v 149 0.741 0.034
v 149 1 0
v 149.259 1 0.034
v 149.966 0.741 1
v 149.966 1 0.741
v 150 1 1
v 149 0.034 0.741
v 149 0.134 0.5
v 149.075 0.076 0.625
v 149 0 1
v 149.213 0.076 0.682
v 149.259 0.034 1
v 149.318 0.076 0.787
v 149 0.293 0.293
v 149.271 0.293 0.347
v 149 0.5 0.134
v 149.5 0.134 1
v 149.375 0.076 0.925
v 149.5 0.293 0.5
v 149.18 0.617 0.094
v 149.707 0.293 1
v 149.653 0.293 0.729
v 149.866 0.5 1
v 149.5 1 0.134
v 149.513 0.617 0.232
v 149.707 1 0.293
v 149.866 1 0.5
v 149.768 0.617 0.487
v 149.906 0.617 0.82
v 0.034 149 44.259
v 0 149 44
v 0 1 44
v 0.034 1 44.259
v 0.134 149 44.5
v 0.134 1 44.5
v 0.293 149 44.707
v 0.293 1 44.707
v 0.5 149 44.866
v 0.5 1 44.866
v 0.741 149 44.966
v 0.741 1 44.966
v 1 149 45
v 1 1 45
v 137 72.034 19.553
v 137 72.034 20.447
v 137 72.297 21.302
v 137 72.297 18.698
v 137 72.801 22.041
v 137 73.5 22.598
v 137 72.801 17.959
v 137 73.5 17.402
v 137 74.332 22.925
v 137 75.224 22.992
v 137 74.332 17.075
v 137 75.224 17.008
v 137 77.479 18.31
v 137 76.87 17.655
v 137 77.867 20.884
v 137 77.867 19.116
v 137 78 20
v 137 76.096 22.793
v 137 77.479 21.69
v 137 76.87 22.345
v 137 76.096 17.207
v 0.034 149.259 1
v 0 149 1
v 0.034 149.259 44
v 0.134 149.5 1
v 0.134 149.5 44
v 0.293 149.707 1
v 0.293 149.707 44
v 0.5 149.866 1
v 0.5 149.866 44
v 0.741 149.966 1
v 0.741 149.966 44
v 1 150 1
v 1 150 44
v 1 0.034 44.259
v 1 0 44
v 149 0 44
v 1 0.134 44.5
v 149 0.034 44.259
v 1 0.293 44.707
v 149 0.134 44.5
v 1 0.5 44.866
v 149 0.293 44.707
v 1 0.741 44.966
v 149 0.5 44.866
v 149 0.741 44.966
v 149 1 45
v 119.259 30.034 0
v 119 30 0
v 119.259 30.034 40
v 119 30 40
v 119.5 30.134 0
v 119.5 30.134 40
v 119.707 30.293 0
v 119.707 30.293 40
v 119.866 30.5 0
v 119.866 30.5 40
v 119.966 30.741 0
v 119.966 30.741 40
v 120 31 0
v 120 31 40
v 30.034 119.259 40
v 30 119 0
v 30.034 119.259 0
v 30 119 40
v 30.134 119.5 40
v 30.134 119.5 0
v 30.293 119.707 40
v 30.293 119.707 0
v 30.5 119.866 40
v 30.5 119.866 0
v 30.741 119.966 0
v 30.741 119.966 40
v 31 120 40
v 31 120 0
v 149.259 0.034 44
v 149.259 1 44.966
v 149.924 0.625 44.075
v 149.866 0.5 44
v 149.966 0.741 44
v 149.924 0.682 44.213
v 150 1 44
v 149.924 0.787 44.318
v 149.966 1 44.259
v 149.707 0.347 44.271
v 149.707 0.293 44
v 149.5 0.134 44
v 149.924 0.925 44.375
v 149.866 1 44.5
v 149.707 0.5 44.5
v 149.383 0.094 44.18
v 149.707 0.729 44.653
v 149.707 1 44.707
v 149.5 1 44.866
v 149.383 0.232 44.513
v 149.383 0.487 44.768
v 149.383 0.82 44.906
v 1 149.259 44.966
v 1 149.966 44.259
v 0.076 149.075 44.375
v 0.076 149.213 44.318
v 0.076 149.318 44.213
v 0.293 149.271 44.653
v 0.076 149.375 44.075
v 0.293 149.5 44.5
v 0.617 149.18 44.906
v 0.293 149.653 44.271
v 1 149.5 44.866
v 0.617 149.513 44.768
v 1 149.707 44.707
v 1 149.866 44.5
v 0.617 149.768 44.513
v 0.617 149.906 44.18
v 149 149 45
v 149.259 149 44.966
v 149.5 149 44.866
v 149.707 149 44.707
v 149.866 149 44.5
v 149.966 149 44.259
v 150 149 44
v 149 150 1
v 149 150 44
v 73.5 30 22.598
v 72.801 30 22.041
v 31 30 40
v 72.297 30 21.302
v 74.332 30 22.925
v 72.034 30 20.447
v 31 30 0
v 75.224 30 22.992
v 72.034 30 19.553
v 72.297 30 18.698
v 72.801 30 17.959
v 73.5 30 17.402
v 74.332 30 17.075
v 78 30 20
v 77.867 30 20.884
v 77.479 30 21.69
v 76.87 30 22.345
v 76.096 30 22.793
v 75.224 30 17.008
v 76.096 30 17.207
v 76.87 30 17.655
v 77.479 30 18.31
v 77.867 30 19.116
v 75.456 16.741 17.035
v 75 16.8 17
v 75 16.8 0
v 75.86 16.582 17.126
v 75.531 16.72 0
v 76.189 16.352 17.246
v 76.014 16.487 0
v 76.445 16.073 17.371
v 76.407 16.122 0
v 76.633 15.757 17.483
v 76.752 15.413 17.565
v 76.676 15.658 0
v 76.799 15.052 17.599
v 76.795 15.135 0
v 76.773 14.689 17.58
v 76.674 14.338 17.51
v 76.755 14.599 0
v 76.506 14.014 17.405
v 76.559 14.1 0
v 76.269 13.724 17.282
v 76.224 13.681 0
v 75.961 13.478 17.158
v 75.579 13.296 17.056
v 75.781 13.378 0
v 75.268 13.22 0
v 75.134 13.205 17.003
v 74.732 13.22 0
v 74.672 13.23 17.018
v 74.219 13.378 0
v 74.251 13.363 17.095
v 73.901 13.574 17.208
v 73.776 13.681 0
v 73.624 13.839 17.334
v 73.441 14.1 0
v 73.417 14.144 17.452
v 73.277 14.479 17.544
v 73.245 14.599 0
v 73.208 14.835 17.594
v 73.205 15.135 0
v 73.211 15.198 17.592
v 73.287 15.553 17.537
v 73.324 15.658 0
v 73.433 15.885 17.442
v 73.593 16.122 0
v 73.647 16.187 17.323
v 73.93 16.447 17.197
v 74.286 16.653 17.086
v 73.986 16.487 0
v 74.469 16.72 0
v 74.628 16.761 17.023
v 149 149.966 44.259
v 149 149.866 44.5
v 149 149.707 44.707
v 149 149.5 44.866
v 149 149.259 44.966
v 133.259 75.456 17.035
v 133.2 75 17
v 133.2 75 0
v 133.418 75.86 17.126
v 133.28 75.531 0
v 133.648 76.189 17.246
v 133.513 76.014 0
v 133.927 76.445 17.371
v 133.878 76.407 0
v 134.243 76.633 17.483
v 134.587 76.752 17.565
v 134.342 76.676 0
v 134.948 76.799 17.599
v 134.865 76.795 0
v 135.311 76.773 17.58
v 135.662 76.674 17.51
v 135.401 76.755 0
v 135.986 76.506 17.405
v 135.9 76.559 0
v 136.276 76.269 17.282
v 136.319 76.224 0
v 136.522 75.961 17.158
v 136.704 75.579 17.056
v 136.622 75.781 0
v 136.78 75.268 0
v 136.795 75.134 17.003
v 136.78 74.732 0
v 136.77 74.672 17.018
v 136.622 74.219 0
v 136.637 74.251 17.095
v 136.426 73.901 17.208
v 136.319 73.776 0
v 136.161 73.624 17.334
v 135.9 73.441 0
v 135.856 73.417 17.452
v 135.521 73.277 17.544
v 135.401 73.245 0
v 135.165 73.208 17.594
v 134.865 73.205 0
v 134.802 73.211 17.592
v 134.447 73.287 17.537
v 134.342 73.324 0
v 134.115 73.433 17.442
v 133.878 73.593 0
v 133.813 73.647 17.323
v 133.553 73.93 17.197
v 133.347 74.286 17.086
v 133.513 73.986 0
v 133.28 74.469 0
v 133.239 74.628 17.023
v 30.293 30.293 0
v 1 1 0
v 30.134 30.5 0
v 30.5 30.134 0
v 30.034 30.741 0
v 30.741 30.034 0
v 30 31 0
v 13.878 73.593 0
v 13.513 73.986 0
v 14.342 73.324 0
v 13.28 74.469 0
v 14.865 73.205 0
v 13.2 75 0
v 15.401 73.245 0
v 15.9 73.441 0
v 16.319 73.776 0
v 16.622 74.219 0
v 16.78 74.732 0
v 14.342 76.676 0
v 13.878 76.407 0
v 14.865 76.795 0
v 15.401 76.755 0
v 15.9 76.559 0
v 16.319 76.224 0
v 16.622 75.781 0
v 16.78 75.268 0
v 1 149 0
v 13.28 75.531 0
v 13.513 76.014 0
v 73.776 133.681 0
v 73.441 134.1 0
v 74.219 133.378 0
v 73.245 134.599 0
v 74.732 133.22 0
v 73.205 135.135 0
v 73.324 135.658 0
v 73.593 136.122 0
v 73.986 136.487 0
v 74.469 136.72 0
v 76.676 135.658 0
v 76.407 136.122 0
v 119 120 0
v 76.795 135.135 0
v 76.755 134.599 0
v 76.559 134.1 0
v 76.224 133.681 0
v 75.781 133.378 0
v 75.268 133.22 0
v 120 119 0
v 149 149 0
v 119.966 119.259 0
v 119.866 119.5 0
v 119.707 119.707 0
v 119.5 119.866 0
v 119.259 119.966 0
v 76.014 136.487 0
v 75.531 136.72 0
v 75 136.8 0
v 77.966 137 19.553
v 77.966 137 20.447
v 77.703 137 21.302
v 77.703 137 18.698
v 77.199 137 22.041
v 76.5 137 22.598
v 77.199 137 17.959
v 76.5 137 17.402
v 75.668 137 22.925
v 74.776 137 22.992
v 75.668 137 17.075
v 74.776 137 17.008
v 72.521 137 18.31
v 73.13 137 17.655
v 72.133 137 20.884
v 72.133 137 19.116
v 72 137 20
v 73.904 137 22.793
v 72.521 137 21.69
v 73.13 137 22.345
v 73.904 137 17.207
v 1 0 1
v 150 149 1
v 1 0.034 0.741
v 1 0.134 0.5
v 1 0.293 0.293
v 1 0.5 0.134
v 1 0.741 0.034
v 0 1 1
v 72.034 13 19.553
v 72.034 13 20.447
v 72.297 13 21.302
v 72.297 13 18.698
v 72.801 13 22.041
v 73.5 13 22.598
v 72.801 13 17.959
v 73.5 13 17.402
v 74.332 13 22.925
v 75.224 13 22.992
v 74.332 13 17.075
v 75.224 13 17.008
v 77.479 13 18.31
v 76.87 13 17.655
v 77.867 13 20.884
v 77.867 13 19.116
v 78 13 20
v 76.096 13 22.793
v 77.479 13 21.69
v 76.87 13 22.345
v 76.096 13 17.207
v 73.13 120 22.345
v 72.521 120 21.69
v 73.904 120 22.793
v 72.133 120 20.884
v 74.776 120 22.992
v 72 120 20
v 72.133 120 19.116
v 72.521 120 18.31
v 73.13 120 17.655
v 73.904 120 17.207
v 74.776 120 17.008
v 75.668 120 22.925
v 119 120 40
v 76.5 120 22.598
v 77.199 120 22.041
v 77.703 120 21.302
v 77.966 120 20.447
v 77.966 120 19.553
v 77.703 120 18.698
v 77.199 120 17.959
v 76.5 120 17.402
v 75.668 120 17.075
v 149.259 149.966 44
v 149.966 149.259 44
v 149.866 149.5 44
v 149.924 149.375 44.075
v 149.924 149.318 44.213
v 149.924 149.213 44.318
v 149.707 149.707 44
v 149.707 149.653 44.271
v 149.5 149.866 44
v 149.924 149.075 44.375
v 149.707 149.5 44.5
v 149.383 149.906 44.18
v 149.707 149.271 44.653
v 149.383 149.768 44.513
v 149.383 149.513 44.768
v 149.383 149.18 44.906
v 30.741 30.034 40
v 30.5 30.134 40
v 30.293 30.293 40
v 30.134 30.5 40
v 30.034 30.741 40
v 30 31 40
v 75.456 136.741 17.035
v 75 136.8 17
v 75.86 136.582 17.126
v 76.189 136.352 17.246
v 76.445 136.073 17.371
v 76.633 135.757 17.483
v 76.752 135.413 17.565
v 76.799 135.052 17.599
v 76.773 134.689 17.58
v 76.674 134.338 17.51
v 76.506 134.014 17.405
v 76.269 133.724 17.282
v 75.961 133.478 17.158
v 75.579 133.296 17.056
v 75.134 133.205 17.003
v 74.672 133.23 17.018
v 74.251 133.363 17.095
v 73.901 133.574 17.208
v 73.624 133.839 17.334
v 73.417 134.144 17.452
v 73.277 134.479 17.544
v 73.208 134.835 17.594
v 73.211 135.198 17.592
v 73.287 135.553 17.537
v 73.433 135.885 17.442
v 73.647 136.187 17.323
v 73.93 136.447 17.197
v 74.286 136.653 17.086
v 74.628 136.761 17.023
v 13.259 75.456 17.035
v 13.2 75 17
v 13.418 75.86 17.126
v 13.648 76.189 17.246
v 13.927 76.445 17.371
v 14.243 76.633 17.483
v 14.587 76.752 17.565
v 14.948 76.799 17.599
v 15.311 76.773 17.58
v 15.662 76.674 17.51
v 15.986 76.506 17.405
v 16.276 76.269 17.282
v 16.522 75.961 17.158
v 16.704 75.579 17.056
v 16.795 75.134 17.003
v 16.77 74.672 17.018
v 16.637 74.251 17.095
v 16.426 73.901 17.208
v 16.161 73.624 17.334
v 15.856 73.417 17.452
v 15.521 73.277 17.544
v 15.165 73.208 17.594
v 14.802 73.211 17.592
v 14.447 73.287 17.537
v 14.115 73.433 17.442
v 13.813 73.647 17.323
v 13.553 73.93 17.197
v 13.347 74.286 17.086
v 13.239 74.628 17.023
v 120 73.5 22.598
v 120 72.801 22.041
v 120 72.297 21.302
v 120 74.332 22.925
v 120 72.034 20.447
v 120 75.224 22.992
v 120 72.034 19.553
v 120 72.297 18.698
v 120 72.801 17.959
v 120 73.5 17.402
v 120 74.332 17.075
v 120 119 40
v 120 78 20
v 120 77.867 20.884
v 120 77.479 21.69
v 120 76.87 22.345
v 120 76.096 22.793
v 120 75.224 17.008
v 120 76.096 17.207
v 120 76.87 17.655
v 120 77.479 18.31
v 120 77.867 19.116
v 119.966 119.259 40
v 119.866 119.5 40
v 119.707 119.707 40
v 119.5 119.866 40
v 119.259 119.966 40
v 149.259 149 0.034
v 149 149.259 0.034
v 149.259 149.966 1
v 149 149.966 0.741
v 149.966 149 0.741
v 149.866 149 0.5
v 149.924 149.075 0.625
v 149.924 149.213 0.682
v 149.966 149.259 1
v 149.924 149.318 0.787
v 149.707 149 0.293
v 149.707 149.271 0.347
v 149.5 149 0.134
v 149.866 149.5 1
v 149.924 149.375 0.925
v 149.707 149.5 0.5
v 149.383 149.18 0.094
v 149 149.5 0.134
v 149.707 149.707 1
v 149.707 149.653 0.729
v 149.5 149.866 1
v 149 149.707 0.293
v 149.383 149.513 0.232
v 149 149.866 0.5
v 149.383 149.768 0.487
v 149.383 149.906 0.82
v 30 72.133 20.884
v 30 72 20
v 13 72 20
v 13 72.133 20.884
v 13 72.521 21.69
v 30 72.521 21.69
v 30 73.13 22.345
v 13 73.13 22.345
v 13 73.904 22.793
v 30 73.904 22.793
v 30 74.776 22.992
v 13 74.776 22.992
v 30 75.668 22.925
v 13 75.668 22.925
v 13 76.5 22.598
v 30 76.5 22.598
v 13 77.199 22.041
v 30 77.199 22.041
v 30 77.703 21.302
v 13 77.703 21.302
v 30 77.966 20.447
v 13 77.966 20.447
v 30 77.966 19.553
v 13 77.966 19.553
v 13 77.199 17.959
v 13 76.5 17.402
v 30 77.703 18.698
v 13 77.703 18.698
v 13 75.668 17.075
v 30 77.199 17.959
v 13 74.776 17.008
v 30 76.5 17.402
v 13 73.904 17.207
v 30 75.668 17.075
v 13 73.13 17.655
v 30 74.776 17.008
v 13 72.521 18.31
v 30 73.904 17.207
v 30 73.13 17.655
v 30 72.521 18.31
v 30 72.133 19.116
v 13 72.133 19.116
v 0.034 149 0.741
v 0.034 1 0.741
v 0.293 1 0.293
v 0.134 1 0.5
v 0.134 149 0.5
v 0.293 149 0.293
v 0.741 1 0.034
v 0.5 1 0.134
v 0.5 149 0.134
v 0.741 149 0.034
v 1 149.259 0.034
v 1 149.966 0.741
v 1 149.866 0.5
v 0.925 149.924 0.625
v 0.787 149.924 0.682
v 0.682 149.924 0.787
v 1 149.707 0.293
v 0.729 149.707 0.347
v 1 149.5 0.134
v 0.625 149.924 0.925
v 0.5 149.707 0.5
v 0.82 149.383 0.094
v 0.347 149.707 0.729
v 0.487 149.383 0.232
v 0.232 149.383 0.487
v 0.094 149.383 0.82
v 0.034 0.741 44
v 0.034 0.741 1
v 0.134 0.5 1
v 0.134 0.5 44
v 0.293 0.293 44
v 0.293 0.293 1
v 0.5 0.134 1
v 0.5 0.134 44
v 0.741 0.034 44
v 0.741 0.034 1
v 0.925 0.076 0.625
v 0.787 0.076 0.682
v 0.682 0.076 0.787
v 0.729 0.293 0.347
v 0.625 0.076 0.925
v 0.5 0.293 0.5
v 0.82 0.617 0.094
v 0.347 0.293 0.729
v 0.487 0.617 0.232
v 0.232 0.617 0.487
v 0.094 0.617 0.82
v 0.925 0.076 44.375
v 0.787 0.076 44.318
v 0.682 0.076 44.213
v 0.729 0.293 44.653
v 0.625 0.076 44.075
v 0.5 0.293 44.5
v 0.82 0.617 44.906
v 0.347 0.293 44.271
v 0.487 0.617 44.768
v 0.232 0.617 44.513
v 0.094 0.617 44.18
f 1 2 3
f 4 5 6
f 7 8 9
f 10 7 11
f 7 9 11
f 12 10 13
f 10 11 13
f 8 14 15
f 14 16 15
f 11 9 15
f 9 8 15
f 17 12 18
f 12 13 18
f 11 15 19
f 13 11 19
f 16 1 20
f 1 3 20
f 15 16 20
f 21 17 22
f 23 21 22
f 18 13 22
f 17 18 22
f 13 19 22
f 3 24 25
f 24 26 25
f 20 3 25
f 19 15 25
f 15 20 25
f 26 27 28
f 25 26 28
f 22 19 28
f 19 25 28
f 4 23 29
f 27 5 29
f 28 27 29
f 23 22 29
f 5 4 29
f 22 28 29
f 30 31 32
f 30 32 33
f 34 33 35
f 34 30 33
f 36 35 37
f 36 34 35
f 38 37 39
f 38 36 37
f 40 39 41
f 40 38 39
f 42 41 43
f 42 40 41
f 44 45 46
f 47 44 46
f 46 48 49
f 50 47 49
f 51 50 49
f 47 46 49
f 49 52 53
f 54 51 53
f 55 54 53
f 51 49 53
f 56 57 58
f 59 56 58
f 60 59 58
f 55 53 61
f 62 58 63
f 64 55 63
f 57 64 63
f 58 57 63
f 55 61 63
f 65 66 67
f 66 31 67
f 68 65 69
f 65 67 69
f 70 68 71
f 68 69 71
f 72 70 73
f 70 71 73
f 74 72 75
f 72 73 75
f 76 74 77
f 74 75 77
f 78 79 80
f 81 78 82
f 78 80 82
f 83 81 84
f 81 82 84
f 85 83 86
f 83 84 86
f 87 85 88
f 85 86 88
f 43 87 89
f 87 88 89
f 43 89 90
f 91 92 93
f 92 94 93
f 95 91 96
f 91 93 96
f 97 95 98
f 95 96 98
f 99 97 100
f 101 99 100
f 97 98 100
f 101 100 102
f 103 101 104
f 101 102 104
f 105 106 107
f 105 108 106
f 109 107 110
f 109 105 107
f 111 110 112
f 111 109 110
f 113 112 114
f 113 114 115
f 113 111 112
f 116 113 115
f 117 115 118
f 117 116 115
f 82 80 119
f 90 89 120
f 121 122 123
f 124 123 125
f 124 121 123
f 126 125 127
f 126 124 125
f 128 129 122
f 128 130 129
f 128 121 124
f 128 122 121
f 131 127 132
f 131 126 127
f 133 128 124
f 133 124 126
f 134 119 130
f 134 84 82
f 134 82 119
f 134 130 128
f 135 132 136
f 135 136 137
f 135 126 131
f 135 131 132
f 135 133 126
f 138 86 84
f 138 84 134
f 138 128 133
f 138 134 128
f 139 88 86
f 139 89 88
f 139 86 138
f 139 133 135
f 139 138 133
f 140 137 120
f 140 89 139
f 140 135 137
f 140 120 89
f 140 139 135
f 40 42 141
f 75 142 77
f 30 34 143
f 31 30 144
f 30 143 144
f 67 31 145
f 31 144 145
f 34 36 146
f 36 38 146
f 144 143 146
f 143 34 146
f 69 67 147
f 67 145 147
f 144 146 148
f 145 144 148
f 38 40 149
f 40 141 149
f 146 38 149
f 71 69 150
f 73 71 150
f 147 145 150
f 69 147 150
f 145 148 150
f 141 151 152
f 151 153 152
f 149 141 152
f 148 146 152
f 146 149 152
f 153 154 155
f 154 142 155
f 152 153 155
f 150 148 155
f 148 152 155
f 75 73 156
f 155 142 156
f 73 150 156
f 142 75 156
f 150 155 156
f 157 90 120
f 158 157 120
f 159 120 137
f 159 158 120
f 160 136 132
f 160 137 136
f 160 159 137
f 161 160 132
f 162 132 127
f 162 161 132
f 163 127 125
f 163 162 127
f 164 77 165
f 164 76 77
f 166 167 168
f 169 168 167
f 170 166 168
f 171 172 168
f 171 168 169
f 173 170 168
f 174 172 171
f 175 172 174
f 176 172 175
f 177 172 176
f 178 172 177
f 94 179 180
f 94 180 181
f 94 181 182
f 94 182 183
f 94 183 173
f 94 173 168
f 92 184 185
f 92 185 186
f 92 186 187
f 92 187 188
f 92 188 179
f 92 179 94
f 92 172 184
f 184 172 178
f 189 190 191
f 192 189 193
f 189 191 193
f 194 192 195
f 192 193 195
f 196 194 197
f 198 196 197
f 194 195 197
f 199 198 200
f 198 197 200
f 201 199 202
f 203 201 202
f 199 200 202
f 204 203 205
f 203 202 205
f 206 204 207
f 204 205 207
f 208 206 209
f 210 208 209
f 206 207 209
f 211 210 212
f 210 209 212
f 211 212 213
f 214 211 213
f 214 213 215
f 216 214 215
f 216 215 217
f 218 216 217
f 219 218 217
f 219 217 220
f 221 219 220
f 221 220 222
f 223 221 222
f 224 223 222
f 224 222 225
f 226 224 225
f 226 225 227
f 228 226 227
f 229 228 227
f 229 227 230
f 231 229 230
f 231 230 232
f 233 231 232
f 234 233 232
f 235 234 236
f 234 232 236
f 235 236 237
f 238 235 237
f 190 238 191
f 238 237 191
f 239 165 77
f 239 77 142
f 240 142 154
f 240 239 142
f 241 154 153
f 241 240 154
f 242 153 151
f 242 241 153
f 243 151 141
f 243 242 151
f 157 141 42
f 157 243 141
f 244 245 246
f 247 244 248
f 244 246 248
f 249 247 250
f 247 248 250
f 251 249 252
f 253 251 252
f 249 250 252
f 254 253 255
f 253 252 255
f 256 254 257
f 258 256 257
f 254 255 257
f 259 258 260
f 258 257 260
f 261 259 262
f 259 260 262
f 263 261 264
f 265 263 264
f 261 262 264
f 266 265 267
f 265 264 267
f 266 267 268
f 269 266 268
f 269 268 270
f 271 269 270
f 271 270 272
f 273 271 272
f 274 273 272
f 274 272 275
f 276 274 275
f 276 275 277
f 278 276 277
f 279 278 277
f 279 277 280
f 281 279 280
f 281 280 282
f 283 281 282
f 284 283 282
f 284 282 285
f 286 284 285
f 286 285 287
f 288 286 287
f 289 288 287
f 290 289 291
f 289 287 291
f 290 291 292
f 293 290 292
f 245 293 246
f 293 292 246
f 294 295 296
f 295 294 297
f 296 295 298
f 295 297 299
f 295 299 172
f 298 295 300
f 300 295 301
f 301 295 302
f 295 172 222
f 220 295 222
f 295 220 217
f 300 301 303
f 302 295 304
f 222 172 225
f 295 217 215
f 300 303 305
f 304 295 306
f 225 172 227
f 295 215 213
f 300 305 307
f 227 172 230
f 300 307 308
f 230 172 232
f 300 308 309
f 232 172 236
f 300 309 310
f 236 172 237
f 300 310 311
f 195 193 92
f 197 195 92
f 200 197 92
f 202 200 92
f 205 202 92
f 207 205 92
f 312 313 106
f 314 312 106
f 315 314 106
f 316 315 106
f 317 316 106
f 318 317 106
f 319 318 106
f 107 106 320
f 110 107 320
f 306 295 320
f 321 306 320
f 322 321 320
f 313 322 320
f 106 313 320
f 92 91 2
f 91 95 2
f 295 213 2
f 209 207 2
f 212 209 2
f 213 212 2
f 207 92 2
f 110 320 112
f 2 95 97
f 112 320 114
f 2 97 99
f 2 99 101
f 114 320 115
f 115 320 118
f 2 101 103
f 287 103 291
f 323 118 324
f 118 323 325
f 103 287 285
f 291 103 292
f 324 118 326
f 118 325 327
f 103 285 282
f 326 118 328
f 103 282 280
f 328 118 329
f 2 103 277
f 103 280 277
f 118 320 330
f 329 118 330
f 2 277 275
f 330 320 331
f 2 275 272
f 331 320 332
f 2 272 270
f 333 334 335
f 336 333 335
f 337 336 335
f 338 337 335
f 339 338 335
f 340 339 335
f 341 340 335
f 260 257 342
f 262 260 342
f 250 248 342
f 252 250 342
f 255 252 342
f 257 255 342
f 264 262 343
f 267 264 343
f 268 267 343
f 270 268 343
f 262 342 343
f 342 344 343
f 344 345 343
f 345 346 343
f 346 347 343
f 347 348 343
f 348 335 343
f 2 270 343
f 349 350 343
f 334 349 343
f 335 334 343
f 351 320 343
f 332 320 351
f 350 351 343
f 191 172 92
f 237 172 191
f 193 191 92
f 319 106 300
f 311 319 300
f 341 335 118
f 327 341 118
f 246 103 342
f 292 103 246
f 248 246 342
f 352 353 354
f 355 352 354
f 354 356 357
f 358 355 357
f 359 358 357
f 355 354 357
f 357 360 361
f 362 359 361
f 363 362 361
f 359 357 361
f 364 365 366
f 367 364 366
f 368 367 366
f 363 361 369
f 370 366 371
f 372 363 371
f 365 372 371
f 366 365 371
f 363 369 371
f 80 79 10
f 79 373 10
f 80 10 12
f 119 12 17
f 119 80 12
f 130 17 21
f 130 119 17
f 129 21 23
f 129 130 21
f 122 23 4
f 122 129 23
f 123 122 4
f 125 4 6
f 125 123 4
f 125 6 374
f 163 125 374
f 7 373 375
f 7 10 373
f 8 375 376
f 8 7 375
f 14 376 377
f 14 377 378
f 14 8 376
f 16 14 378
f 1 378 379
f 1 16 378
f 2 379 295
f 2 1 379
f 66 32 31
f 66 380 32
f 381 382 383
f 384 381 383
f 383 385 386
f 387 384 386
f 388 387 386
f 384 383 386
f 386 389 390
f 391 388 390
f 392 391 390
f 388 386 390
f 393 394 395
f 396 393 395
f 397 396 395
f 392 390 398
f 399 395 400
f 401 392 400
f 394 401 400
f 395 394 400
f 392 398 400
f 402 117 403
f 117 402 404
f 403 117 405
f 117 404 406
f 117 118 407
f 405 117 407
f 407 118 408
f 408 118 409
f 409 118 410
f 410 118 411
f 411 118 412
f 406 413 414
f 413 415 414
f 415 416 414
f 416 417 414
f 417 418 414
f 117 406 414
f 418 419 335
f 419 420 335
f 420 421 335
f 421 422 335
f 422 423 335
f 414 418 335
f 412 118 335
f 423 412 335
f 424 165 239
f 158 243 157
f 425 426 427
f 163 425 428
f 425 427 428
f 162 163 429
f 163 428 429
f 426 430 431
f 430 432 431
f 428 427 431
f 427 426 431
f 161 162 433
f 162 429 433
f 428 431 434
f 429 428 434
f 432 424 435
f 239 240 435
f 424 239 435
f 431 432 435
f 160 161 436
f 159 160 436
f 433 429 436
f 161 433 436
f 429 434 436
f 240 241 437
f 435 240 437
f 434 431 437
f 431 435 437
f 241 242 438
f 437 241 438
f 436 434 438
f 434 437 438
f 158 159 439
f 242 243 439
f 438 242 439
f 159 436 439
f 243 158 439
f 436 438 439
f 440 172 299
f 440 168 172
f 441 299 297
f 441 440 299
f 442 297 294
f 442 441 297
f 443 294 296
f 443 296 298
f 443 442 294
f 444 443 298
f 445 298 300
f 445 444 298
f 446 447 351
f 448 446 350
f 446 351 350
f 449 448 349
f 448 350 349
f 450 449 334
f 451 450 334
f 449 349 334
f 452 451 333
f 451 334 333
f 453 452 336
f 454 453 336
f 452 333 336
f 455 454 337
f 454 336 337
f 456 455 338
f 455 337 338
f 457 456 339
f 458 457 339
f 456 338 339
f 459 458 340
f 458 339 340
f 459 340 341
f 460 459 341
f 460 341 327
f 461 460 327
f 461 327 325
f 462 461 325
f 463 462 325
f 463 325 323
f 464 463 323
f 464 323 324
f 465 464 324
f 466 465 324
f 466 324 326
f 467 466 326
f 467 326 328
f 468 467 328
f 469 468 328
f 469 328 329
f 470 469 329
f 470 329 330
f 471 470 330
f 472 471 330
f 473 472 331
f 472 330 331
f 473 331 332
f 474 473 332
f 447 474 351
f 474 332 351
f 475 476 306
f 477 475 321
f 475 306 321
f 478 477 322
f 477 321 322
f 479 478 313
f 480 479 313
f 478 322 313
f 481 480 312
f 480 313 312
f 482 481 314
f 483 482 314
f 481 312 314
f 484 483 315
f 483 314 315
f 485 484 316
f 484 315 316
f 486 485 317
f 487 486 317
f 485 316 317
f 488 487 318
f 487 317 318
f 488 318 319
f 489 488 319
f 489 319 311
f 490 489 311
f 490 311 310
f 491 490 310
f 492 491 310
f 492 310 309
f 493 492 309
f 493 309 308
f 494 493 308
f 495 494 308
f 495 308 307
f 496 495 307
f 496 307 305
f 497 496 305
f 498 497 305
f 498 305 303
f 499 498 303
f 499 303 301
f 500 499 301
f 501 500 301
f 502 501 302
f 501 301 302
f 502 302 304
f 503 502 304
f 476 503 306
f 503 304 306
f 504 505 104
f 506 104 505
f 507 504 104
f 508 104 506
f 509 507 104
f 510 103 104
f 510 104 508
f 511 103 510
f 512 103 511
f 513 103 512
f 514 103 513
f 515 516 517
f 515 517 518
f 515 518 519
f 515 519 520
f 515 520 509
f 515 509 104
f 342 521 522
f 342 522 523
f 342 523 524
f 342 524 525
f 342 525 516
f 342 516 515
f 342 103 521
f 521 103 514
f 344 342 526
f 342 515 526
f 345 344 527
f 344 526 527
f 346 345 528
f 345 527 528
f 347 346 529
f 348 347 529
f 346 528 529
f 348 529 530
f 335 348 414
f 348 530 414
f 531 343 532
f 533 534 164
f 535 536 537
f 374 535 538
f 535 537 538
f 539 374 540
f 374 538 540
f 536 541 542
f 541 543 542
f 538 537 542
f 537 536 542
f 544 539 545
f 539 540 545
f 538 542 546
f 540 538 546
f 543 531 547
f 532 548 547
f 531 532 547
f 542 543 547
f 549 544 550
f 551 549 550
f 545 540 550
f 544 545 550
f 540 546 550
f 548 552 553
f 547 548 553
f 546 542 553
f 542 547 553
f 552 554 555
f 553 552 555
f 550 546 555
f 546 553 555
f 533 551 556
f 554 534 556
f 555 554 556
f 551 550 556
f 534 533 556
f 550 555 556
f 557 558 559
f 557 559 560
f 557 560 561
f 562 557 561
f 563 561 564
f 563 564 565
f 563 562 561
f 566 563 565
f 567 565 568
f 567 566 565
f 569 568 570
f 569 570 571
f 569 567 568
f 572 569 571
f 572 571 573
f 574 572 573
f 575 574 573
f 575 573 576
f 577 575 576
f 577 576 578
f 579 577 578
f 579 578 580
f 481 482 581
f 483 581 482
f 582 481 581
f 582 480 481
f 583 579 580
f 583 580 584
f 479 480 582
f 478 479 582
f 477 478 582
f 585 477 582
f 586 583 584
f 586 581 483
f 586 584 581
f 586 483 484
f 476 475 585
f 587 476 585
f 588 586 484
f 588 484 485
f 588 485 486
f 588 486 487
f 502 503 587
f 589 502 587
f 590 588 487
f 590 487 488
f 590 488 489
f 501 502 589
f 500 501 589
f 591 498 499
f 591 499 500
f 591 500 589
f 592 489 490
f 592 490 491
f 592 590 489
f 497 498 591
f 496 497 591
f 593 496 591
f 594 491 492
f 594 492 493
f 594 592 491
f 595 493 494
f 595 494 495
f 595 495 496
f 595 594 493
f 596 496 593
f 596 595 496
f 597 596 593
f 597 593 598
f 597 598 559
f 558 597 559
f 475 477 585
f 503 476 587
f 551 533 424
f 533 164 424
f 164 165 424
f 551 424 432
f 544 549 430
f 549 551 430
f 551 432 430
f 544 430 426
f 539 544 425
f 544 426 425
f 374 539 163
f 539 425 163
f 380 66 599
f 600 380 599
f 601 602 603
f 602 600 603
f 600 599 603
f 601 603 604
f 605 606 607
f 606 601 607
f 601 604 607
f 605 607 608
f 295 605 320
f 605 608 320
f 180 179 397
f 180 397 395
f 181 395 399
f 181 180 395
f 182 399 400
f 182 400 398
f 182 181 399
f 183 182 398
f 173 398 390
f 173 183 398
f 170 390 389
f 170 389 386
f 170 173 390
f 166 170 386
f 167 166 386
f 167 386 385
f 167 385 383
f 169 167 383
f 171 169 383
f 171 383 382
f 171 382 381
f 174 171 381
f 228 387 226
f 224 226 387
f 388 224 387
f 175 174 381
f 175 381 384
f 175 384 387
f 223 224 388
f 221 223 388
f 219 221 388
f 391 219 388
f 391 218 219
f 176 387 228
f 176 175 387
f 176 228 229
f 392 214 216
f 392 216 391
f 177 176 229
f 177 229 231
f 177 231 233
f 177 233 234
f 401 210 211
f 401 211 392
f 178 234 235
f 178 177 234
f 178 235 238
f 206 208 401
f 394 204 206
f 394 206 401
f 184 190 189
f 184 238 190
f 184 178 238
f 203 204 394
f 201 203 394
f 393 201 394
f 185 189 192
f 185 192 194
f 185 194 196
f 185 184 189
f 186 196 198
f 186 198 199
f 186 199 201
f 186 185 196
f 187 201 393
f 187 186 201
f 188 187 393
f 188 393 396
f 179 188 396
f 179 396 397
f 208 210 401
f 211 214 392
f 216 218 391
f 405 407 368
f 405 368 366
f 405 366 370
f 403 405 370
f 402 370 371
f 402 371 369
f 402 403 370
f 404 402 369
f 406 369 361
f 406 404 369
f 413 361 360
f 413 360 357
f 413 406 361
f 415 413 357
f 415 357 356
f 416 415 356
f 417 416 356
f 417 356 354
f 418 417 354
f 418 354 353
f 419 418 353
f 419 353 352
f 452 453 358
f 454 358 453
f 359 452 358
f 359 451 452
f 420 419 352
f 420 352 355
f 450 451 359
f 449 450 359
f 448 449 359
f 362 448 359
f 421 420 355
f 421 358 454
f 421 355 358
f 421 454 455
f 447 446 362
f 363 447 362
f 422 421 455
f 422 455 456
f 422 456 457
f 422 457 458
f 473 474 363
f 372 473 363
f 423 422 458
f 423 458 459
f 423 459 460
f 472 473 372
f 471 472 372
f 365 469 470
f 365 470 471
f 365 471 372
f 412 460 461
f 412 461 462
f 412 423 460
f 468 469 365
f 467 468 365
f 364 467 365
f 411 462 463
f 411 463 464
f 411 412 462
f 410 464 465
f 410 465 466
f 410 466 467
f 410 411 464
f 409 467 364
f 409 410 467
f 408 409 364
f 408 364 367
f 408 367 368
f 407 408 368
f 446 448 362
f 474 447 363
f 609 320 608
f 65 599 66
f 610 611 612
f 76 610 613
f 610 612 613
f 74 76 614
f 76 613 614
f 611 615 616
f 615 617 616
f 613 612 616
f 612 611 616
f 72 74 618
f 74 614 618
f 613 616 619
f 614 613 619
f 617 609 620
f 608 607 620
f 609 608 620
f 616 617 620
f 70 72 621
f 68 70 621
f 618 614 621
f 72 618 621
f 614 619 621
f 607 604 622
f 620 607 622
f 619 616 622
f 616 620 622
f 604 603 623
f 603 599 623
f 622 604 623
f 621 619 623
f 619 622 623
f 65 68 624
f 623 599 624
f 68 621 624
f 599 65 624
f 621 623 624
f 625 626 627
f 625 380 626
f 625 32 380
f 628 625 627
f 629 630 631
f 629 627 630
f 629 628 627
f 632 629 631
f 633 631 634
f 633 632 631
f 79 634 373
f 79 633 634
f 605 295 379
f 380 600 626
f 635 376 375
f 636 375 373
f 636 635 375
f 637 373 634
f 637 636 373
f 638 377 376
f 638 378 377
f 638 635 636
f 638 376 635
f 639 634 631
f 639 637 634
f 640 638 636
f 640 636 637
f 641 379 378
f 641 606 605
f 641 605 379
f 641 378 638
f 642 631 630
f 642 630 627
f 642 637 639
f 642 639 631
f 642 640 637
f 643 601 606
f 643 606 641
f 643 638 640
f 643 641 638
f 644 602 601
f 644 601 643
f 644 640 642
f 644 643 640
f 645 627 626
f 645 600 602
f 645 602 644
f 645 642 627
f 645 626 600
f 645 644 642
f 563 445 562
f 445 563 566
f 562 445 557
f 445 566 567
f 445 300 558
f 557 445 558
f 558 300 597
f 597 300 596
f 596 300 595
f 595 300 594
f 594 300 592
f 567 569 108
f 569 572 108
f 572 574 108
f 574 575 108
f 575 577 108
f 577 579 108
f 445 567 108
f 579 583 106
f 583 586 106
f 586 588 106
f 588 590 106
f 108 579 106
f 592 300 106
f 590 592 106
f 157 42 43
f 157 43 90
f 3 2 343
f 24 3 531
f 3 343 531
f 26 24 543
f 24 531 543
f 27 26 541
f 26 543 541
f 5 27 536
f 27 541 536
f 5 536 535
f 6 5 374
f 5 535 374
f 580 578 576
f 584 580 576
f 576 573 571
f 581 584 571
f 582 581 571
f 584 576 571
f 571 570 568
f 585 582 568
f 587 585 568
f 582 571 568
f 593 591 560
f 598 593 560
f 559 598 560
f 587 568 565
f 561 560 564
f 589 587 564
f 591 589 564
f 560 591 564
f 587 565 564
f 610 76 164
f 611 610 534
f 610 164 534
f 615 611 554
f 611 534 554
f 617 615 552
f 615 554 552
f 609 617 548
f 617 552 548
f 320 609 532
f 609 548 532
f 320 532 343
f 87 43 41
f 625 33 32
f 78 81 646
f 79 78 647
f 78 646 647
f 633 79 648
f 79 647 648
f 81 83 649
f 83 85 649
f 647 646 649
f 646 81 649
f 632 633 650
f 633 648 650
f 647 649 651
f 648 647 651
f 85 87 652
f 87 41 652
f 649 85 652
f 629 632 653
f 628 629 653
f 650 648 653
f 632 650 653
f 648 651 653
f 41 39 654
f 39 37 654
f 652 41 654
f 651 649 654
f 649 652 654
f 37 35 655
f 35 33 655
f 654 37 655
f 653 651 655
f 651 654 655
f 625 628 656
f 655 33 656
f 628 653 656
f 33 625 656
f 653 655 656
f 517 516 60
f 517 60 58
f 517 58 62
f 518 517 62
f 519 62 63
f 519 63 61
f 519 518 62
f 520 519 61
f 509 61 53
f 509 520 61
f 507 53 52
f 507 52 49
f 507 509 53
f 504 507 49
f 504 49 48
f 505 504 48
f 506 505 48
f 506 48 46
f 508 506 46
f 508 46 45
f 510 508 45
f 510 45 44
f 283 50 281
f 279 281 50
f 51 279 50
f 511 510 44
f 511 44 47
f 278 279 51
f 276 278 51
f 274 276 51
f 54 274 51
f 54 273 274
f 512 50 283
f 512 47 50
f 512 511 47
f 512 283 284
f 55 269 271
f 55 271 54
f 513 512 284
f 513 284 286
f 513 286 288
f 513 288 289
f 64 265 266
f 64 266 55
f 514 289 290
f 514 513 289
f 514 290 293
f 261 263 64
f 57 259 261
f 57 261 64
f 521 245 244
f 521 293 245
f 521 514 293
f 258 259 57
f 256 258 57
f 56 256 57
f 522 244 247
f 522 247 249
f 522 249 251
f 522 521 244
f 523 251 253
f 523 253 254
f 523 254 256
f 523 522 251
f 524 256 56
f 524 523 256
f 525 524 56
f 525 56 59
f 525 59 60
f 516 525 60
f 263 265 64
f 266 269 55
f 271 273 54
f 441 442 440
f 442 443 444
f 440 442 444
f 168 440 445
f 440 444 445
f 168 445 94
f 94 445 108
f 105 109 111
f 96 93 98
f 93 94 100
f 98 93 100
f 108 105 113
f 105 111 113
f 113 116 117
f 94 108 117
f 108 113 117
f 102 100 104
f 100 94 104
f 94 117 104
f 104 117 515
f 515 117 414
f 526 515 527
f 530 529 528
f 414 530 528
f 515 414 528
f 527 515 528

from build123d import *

# Parameters (mm, degrees)
SKETCH1_W           = 150
SKETCH1_H           = 150
BOSS_EXTRUDE1_DEPTH = 45
SKETCH2_W           = 90
SKETCH2_H           = 90
CUT_EXTRUDE1_DEPTH  = 40
SKETCH6_R           = 1.8
CUT_EXTRUDE2_DEPTH  = 20
CIRPATTERN1_COUNT   = 2
CIRPATTERN1_ANGLE   = 90
SKETCH8_R           = 3
CUT_EXTRUDE4_DEPTH  = 17
CIRPATTERN2_COUNT   = 4
FILLET1_R           = 1
FILLET2_R           = 1


with BuildPart() as part:
    # Sketch1 → Boss-Extrude1 (new body)
    with BuildSketch(Plane.XY):
        with Locations((75, 75)):
            Rectangle(SKETCH1_W, SKETCH1_H)
    extrude(amount=BOSS_EXTRUDE1_DEPTH)

    # Sketch2 → Cut-Extrude1 (cut)
    with BuildSketch(Plane.XY):
        with Locations((75, 75)):
            Rectangle(SKETCH2_W, SKETCH2_H)
    extrude(amount=CUT_EXTRUDE1_DEPTH, mode=Mode.SUBTRACT)

    # Sketch6 → Cut-Extrude2 (cut)
    with BuildSketch(Plane(origin=(0, 0, 0), x_dir=(-1, 0, 0), z_dir=(0, 0, -1))):
        with Locations((-135, 75)):
            Circle(SKETCH6_R)
        with Locations((-15, 75)):
            Circle(SKETCH6_R)
    cut_extrude2 = extrude(amount=-CUT_EXTRUDE2_DEPTH, mode=Mode.SUBTRACT)

    # CirPattern1: Cut-Extrude2 ×2 about axis
    cirpattern1_axis = Axis((75, 75, 0), (0, 0, -1))
    for i in range(1, CIRPATTERN1_COUNT):
        add(cut_extrude2.rotate(cirpattern1_axis, i * CIRPATTERN1_ANGLE / (CIRPATTERN1_COUNT - 1)), mode=Mode.SUBTRACT)

    # Sketch8 → Cut-Extrude4 (cut)
    with BuildSketch(Plane(origin=(120, 0, 0), x_dir=(0, 0, -1), z_dir=(1, 0, 0))):
        with Locations(Location((-20, 75, 0), (0, 0, 90))):
            Circle(SKETCH8_R)
    cut_extrude4 = extrude(amount=CUT_EXTRUDE4_DEPTH, mode=Mode.SUBTRACT)

    # CirPattern2: Cut-Extrude4 ×4 about axis
    cirpattern2_axis = Axis((75, 75, 0), (0, 0, 1))
    for i in range(1, CIRPATTERN2_COUNT):
        add(cut_extrude4.rotate(cirpattern2_axis, i * 360 / CIRPATTERN2_COUNT), mode=Mode.SUBTRACT)

    # Fillet1
    fillet1_edges = [part.edges().sort_by_distance(p)[0] for p in [
        (75, 150, 45),
        (0, 75, 45),
        (75, 0, 45),
        (0, 75, 0),
        (75, 150, 0),
        (150, 75, 0),
        (75, 0, 0),
        (0, 0, 22.5),
        (0, 150, 22.5),
        (150, 150, 22.5),
        (150, 0, 22.5),
        (150, 75, 45),
    ]]
    fillet(fillet1_edges, radius=FILLET1_R)

    # Fillet2
    fillet2_edges = [part.edges().sort_by_distance(p)[0] for p in [
        (120, 30, 20),
        (120, 120, 20),
        (30, 120, 20),
        (30, 30, 20),
    ]]
    fillet(fillet2_edges, radius=FILLET2_R)


solid = part.part
